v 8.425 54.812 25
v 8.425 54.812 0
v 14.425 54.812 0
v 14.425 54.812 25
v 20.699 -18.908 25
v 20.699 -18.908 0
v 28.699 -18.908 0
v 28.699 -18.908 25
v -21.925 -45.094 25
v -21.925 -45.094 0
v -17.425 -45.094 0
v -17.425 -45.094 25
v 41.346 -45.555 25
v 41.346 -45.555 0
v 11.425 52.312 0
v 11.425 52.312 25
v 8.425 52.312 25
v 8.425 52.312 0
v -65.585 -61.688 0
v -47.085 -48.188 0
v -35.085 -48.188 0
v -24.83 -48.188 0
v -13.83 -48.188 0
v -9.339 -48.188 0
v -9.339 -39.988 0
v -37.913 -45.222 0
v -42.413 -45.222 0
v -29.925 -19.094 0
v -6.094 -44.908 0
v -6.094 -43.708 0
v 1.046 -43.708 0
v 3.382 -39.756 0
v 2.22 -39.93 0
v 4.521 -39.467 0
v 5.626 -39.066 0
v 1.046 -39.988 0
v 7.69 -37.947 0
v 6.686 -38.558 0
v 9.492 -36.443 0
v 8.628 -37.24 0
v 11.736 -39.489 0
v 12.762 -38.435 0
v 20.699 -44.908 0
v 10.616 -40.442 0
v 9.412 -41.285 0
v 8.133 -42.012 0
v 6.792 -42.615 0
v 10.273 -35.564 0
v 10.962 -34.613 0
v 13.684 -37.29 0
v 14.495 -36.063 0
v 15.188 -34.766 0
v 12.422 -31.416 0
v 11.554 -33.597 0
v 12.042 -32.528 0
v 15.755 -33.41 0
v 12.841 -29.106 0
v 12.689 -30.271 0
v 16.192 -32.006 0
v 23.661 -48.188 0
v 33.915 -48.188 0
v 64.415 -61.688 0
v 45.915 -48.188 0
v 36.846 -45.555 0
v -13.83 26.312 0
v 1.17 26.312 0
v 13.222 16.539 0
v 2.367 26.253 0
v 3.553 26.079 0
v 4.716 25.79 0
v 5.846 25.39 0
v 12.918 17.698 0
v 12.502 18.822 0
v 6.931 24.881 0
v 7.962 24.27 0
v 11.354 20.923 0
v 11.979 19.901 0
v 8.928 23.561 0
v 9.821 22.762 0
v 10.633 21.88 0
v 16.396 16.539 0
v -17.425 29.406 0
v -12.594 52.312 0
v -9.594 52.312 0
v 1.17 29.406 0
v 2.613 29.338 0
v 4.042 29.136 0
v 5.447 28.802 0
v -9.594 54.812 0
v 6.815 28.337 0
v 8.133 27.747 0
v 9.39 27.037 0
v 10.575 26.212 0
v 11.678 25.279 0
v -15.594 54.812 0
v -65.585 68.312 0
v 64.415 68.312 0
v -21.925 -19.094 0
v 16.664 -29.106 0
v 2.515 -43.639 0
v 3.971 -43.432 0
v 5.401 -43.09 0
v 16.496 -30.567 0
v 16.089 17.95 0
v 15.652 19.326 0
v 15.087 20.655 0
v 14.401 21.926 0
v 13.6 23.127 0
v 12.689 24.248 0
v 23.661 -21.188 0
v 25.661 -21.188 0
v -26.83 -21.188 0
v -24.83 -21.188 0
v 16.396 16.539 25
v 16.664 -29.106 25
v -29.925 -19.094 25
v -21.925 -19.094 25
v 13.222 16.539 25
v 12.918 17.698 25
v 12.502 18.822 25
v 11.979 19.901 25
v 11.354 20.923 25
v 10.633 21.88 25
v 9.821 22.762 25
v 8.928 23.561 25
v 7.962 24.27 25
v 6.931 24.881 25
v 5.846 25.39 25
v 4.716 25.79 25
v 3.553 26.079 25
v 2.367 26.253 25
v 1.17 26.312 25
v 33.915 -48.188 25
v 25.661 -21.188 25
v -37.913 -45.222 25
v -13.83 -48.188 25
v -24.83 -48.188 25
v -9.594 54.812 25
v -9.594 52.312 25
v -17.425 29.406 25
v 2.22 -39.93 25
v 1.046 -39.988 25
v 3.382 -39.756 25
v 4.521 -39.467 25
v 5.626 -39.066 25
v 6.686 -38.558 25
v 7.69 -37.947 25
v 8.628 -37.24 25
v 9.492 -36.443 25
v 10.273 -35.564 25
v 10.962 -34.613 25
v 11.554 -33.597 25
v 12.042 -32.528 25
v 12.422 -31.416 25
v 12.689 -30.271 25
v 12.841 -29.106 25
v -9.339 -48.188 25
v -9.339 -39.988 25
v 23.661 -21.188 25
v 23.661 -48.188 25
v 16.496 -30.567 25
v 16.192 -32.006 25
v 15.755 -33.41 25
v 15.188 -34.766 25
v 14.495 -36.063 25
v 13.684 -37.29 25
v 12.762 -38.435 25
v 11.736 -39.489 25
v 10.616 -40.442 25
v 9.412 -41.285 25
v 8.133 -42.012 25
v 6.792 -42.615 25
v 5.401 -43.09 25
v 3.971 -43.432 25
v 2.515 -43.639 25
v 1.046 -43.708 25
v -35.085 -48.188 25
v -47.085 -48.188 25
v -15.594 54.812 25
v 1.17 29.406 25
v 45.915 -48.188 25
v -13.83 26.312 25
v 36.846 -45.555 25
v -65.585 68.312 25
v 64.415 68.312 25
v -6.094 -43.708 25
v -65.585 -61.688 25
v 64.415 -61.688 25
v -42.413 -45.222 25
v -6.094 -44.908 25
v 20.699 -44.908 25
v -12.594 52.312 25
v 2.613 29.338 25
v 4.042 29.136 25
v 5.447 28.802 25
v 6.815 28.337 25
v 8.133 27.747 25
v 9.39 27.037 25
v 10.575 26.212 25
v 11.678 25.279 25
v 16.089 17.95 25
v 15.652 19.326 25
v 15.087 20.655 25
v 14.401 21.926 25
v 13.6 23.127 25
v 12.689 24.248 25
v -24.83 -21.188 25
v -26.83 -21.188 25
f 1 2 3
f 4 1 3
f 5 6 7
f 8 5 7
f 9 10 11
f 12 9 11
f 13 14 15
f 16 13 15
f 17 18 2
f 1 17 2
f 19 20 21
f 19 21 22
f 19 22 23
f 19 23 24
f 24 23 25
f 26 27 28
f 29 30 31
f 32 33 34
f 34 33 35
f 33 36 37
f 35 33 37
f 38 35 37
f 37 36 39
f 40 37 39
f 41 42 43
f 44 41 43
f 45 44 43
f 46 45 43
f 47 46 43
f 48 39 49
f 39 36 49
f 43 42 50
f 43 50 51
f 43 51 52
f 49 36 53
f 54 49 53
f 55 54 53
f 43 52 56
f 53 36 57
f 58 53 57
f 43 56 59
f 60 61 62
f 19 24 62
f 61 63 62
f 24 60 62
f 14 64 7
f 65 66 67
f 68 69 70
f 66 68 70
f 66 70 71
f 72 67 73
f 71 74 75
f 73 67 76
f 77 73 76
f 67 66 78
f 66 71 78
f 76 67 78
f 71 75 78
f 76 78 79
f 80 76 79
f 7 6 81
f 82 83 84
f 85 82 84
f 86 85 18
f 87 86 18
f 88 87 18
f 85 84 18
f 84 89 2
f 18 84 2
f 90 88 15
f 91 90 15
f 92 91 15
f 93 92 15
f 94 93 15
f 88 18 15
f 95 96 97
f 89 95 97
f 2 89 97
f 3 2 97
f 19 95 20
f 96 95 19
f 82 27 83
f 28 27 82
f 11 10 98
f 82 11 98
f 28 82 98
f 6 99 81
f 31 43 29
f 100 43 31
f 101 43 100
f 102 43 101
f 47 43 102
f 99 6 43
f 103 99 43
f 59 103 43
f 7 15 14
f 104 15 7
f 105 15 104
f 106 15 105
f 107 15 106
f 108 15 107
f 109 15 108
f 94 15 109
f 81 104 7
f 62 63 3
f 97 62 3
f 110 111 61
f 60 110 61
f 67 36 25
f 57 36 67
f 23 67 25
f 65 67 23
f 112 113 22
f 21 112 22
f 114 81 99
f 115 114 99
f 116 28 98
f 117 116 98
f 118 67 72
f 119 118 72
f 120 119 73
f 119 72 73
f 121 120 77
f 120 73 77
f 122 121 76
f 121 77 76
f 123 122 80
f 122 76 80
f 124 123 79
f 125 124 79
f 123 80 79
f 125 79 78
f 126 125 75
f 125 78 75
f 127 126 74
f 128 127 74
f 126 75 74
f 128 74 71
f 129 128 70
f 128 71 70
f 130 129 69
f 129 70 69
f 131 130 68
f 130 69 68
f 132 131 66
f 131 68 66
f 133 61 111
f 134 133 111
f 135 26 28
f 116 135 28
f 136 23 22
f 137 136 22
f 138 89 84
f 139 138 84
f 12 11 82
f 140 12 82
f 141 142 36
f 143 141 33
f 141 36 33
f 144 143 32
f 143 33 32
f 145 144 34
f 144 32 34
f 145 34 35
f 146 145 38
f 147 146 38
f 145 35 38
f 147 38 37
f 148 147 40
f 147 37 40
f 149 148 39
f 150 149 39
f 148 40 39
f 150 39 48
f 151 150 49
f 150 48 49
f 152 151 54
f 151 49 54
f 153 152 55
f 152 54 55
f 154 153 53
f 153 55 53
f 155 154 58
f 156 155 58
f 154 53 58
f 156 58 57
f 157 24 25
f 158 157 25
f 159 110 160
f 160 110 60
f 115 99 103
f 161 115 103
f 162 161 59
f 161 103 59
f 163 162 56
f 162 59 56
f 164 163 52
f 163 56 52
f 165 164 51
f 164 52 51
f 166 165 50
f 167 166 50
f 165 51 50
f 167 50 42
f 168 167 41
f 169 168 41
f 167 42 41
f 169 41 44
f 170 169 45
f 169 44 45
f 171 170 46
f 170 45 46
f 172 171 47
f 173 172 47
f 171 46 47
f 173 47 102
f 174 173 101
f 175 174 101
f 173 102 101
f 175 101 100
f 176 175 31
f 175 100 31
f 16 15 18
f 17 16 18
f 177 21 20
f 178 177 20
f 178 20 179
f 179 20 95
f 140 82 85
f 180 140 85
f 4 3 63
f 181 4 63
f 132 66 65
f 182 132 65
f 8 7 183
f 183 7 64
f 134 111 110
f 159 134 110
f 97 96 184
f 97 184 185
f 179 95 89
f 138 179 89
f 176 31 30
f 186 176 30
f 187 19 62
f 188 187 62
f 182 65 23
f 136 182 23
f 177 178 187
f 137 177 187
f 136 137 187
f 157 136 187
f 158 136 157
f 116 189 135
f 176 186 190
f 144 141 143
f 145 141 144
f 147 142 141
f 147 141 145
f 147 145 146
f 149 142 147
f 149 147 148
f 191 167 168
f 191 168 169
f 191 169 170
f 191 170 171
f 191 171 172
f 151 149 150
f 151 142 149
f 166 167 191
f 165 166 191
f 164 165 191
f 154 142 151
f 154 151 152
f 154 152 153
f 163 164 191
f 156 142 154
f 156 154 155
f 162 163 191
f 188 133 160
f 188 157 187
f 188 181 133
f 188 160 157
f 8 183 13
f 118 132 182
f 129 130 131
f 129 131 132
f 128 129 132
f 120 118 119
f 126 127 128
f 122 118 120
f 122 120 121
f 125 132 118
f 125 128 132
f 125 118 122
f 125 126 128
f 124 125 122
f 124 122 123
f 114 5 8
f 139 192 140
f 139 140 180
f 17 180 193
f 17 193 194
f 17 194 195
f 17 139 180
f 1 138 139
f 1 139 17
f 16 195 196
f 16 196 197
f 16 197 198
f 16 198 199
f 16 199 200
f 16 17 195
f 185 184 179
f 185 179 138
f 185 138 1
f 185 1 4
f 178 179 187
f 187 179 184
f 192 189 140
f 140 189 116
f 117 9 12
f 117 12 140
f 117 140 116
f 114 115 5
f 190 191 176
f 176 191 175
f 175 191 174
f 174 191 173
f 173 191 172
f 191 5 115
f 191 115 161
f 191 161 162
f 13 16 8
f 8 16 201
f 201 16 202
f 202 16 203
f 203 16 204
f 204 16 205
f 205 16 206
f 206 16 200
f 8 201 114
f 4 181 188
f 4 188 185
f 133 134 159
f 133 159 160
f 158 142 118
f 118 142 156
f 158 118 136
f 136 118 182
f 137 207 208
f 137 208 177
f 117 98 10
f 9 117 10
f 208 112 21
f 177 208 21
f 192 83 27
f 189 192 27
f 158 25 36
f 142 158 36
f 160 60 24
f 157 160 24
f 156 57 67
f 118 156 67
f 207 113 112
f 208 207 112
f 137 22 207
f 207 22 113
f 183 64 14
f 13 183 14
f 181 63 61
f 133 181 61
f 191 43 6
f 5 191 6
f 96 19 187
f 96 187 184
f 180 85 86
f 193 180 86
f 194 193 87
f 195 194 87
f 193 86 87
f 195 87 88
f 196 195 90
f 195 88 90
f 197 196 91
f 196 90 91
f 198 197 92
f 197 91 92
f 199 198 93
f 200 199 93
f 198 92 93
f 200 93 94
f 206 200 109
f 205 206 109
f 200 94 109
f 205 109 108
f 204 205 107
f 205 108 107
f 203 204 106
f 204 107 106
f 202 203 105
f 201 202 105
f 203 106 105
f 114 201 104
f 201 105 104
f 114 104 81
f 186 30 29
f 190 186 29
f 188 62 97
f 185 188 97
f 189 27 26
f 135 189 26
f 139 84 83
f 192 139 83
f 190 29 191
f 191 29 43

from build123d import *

# Parameters (mm, degrees)
F0_W     = 130
F0_H     = 130
F1_DEPTH = 25


with BuildPart() as f1:
    # F0 (on Top) → F1 (new body)
    with BuildSketch(Plane.XY):
        with Locations((-0.584693, 3.311556)):
            Rectangle(F0_W, F0_H)
        with BuildLine():
            Line((-15.594432, 54.811556), (-9.594432, 54.811556))
            Line((-9.594432, 54.811556), (-9.594432, 52.311556))
            Line((-9.594432, 52.311556), (-12.594432, 52.311556))
            Line((-12.594432, 52.311556), (-42.41335, -45.22173))
            Line((-42.41335, -45.22173), (-37.91335, -45.22173))
            Line((-37.91335, -45.22173), (-29.92532, -19.09406))
            Line((-29.92532, -19.09406), (-21.92532, -19.09406))
            Line((-21.92532, -19.09406), (-21.92532, -45.09406))
            Line((-21.92532, -45.09406), (-17.42532, -45.09406))
            Line((-17.42532, -45.09406), (-17.42532, 29.40594))
            Line((-17.42532, 29.40594), (1.170036, 29.40594))
            ThreePointArc((1.170036, 29.40594), (11.137538, 25.758417), (16.396462, 16.538914))
            Line((16.396462, 16.538914), (16.663941, -29.106018))
            ThreePointArc((16.663941, -29.106018), (11.736324, -39.489004), (1.045823, -43.708128))
            Line((1.045823, -43.708128), (-6.094494, -43.708128))
            Line((-6.094494, -43.708128), (-6.094494, -44.908128))
            Line((-6.094494, -44.908128), (20.69909, -44.908128))
            Line((20.69909, -44.908128), (20.69909, -18.908128))
            Line((20.69909, -18.908128), (28.69909, -18.908128))
            Line((28.69909, -18.908128), (36.84589, -45.55511))
            Line((36.84589, -45.55511), (41.34589, -45.55511))
            Line((41.34589, -45.55511), (11.425047, 52.311556))
            Line((11.425047, 52.311556), (8.425047, 52.311556))
            Line((8.425047, 52.311556), (8.425047, 54.811556))
            Line((8.425047, 54.811556), (14.425047, 54.811556))
            Line((14.425047, 54.811556), (45.915307, -48.188444))
            Line((45.915307, -48.188444), (33.915307, -48.188444))
            Line((33.915307, -48.188444), (25.660579, -21.188444))
            Line((25.660579, -21.188444), (23.660579, -21.188444))
            Line((23.660579, -21.188444), (23.660579, -48.188444))
            Line((23.660579, -48.188444), (-9.339421, -48.188444))
            Line((-9.339421, -48.188444), (-9.339421, -39.988444))
            Line((-9.339421, -39.988444), (1.045823, -39.988444))
            ThreePointArc((1.045823, -39.988444), (9.070223, -36.852271), (12.841448, -29.106018))
            Line((12.841448, -29.106018), (13.222281, 16.538914))
            ThreePointArc((13.222281, 16.538914), (8.928276, 23.561392), (1.170036, 26.311556))
            Line((1.170036, 26.311556), (-13.829964, 26.311556))
            Line((-13.829964, 26.311556), (-13.829964, -48.188444))
            Line((-13.829964, -48.188444), (-24.829964, -48.188444))
            Line((-24.829964, -48.188444), (-24.829964, -21.188444))
            Line((-24.829964, -21.188444), (-26.829964, -21.188444))
            Line((-26.829964, -21.188444), (-35.084693, -48.188444))
            Line((-35.084693, -48.188444), (-47.084693, -48.188444))
            Line((-47.084693, -48.188444), (-15.594432, 54.811556))
        make_face(mode=Mode.SUBTRACT)
    extrude(amount=F1_DEPTH)


solid = f1.part
